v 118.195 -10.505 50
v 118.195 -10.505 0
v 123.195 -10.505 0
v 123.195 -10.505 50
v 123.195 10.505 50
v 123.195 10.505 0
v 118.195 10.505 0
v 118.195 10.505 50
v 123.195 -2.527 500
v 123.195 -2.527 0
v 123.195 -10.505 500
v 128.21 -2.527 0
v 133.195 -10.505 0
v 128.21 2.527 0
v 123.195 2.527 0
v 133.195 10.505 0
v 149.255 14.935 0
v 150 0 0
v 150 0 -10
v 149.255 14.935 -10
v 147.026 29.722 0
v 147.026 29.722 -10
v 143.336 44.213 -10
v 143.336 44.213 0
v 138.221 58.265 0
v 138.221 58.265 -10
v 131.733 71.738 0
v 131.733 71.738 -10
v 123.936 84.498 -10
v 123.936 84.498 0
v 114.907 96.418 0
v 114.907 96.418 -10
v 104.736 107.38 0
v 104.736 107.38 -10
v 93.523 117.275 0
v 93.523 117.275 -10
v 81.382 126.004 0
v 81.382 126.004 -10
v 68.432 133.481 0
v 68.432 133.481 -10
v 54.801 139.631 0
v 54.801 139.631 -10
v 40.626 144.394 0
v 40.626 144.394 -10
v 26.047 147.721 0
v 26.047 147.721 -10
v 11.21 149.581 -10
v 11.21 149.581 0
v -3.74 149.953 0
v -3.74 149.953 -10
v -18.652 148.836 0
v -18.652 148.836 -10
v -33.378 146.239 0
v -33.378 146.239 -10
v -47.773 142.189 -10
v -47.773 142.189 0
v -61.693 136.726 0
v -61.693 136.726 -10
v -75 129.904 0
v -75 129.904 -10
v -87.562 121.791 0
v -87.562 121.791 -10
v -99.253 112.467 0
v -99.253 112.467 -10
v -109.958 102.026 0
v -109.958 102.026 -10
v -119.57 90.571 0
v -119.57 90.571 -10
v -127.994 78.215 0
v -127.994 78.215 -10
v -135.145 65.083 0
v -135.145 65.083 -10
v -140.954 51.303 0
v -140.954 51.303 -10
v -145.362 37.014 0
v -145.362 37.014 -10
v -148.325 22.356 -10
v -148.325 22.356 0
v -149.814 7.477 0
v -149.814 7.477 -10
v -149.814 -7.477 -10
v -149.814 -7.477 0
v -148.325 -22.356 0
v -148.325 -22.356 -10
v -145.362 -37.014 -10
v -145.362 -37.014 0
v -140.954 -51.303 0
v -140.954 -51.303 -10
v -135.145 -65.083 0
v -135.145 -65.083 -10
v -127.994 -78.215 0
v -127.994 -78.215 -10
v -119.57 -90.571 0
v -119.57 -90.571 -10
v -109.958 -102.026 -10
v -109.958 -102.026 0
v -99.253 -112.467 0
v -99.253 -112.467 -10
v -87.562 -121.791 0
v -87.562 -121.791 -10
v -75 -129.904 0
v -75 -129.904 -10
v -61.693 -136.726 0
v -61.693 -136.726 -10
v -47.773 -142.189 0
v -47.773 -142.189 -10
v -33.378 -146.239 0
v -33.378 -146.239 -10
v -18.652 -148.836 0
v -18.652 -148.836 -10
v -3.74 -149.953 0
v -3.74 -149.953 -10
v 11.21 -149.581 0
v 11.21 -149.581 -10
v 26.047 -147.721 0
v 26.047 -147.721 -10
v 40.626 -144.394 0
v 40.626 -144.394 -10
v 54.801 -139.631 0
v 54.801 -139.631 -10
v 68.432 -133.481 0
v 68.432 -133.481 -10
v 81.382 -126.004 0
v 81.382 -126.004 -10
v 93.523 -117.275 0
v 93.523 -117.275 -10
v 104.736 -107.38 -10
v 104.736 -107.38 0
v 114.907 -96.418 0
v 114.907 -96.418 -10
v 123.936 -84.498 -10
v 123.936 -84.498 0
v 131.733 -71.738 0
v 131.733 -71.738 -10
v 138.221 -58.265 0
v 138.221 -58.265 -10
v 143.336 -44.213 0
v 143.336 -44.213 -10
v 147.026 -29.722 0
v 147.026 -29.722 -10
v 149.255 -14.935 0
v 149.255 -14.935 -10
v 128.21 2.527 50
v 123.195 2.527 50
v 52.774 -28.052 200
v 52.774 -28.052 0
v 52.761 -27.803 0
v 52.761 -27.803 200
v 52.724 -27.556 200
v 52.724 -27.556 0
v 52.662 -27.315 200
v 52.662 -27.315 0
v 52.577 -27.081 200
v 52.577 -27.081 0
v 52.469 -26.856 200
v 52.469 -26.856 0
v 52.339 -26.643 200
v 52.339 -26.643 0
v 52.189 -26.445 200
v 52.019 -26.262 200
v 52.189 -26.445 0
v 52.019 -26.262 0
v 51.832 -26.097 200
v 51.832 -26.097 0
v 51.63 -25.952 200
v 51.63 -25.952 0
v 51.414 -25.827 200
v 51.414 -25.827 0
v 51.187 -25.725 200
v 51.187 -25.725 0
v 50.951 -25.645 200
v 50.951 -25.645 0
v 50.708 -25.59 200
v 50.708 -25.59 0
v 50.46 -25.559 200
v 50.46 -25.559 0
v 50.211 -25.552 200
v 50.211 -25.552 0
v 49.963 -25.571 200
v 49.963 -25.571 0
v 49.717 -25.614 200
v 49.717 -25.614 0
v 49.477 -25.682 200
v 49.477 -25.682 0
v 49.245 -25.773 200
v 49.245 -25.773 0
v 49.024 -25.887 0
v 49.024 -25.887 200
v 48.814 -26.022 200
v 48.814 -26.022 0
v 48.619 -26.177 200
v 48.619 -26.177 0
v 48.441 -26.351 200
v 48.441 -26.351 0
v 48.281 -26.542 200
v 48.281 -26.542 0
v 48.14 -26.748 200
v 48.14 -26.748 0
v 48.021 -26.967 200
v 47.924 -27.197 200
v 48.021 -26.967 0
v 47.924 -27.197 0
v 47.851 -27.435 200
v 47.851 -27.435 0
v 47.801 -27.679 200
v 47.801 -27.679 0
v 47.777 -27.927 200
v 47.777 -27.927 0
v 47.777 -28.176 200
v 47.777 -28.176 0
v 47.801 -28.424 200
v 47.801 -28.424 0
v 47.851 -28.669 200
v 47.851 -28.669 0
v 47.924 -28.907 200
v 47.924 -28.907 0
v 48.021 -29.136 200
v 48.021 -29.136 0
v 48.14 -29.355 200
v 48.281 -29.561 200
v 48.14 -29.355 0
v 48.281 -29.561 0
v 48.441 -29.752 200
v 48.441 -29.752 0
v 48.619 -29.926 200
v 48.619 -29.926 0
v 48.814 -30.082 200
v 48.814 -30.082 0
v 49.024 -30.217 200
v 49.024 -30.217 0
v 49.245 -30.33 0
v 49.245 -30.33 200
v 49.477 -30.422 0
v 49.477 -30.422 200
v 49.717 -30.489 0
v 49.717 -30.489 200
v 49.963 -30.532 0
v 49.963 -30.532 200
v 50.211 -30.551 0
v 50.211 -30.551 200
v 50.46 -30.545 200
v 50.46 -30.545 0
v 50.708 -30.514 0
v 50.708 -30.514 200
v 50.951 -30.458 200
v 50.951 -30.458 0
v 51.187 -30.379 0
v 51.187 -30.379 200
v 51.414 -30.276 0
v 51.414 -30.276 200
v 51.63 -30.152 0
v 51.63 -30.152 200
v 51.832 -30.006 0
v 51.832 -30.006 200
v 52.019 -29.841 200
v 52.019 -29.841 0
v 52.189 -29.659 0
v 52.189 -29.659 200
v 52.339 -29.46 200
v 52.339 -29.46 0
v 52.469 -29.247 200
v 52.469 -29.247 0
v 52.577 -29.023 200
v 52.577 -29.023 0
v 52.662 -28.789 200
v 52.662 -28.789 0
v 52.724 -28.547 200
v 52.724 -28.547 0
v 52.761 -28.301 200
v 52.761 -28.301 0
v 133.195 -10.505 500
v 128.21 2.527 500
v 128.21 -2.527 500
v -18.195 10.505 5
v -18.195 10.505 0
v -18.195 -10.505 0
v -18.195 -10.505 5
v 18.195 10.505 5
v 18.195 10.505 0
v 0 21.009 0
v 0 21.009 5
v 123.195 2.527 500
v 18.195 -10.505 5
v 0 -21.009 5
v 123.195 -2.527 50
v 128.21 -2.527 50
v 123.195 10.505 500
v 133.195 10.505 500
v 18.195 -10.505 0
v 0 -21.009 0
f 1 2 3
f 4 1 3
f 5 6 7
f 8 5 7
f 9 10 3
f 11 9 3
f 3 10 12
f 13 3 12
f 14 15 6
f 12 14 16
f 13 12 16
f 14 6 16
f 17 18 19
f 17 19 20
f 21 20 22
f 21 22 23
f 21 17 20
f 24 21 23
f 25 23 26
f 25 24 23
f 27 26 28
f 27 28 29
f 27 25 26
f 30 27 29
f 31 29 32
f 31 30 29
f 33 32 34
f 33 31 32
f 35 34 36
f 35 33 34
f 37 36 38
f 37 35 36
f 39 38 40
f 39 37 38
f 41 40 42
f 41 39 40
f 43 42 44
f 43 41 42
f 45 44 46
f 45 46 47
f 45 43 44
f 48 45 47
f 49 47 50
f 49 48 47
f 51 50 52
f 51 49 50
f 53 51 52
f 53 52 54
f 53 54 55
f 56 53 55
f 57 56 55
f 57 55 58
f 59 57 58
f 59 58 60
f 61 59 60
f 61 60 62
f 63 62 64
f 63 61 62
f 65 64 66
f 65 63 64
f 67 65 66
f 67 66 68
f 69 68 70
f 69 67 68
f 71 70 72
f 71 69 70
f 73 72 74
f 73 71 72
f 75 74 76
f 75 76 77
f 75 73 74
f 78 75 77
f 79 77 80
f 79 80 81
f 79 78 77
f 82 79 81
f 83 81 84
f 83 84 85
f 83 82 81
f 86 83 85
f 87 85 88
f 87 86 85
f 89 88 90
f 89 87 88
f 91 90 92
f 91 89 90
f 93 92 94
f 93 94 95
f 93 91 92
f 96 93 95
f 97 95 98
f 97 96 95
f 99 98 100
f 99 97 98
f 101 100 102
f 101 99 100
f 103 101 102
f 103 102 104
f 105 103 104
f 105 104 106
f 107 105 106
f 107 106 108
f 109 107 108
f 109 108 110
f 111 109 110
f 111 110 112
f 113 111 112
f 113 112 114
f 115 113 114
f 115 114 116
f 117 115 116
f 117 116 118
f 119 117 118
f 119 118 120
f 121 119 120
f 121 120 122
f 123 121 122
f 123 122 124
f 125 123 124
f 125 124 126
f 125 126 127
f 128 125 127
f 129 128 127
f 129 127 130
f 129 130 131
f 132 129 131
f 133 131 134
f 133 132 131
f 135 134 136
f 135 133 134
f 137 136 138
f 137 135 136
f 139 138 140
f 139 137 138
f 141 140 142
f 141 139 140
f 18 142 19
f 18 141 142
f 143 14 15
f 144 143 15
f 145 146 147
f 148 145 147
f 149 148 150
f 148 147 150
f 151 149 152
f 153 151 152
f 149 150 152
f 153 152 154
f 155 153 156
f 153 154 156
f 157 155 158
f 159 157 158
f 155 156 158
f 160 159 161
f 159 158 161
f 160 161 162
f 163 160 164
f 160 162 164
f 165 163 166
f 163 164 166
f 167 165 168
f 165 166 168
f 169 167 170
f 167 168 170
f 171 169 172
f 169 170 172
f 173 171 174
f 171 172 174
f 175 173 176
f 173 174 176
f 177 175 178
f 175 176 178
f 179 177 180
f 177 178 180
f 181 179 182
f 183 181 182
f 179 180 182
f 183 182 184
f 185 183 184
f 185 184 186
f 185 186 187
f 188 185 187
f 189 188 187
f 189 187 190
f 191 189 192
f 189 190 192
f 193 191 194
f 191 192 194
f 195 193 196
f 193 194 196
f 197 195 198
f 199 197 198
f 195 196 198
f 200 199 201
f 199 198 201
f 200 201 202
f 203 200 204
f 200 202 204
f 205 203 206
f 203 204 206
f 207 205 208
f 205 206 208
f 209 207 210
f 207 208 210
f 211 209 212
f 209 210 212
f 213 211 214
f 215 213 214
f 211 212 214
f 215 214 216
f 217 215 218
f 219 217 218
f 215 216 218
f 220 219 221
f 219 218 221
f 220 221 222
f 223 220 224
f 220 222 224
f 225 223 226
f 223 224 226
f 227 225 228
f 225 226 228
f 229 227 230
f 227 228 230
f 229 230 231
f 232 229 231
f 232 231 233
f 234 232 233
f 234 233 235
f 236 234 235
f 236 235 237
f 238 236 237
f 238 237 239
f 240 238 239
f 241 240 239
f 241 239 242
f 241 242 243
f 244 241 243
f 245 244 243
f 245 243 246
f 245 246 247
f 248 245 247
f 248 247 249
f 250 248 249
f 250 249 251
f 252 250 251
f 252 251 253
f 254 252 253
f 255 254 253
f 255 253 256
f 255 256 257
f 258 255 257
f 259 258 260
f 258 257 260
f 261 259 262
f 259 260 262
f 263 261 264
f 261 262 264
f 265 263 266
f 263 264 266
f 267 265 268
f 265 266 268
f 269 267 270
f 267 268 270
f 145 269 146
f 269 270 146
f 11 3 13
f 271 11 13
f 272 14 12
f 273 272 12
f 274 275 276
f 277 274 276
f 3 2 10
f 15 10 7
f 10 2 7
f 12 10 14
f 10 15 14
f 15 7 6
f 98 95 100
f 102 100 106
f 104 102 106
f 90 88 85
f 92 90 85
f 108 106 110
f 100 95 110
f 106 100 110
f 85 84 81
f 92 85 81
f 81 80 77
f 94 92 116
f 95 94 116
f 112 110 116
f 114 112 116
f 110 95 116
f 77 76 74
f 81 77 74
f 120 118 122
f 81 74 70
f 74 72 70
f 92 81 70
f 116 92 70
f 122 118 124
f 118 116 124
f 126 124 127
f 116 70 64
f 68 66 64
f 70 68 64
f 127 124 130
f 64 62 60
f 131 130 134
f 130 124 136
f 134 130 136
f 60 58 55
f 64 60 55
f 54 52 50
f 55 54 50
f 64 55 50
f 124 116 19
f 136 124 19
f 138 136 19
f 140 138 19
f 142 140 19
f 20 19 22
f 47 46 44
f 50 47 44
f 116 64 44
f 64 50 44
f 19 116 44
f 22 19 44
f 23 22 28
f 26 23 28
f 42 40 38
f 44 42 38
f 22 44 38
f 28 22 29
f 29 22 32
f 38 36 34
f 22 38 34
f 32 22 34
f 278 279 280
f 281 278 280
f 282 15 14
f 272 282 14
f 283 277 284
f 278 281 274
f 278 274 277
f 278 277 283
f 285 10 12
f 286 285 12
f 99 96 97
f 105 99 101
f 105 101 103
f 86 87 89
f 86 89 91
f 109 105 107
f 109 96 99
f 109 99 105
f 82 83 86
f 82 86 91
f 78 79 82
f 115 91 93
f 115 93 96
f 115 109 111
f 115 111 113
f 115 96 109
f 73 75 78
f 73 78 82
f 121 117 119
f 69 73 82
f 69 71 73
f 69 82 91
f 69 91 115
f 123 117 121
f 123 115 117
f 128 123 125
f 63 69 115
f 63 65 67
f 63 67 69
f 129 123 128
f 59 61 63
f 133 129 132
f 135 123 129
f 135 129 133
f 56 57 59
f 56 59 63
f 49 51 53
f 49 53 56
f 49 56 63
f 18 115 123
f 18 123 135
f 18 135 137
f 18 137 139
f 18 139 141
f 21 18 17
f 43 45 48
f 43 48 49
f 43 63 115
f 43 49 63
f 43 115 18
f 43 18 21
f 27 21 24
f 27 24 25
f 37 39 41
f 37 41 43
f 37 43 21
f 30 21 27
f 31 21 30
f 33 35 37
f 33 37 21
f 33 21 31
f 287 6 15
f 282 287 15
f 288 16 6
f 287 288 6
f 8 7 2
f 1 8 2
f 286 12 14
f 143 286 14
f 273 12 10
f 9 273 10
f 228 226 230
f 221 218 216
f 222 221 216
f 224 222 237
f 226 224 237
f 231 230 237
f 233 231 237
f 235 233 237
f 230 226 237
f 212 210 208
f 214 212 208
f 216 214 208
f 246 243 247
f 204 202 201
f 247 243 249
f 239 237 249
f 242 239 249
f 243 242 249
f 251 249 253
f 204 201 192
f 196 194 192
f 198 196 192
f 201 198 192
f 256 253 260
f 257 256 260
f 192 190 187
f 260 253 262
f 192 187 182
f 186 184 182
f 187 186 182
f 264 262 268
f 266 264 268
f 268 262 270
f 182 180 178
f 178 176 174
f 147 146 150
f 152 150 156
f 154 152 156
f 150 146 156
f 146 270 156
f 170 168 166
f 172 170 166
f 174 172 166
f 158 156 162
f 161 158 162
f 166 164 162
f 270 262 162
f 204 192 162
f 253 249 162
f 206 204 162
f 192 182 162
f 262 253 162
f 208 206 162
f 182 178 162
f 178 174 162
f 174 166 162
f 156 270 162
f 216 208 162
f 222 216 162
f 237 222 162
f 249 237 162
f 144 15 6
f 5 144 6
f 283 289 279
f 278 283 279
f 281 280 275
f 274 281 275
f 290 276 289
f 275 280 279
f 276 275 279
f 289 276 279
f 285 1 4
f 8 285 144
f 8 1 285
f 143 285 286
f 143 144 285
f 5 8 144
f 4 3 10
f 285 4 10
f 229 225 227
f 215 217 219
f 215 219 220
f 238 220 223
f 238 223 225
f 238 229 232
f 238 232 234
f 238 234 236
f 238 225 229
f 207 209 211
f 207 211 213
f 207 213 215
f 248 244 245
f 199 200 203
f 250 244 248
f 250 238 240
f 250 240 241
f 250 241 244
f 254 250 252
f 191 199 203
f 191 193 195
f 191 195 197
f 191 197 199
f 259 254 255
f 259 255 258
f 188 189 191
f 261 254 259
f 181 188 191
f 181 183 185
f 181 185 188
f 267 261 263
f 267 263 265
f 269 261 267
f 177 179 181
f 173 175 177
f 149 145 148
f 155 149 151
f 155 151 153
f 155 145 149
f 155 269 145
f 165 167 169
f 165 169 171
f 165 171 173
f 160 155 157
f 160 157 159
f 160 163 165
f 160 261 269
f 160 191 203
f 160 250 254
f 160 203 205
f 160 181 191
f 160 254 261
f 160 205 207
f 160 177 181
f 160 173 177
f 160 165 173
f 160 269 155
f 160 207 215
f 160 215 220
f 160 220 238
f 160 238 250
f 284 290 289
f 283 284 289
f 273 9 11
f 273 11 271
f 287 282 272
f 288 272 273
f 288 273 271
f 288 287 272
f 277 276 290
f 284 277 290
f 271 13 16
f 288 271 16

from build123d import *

# Parameters (mm, degrees)
F1_DEPTH = 500
F2_DEPTH = 5
F3_DEPTH = 50
F0_R     = 2.5
F4_DEPTH = 200
F0_R_2   = 150
F5_DEPTH = 10


with BuildPart() as f1:
    # F0 (on Top) → F1 (new body)
    with BuildSketch(Plane.XY):
        Polygon((133.19461, 10.504663), (123.19461, 10.504663), (123.19461, 2.526928), (128.209675, 2.526928), (128.209675, -2.526928), (123.19461, -2.526928), (123.19461, -10.504663), (133.19461, -10.504663), align=None)
    extrude(amount=F1_DEPTH)


with BuildPart() as f2:
    # F0 (on Top) → F2 (new body)
    with BuildSketch(Plane.XY):
        Polygon((18.19461, -10.504663), (18.19461, 10.504663), (0, 21.009326), (-18.19461, 10.504663), (-18.19461, -10.504663), (0, -21.009326), align=None)
    extrude(amount=F2_DEPTH)


with BuildPart() as f3:
    # F0 (on Top) → F3 (new body)
    with BuildSketch(Plane.XY):
        Polygon((123.19461, 10.504663), (118.19461, 10.504663), (118.19461, -10.504663), (123.19461, -10.504663), (123.19461, -2.526928), (128.209675, -2.526928), (128.209675, 2.526928), (123.19461, 2.526928), align=None)
    extrude(amount=F3_DEPTH)


with BuildPart() as f4:
    # F0 (on Top) → F4 (new body)
    with BuildSketch(Plane.XY):
        with Locations((50.273504, -28.051721)):
            Circle(F0_R)
    extrude(amount=F4_DEPTH)


with BuildPart() as f5:
    # F0 (on Top) → F5 (new body)
    with BuildSketch(Plane.XY):
        Circle(F0_R_2)
        with Locations((50.273504, -28.051721)):
            Circle(F0_R, mode=Mode.SUBTRACT)
        Polygon((0, 21.009326), (18.19461, 10.504663), (18.19461, -10.504663), (0, -21.009326), (-18.19461, -10.504663), (-18.19461, 10.504663), align=None, mode=Mode.SUBTRACT)
        Polygon((118.19461, -10.504663), (118.19461, 10.504663), (123.19461, 10.504663), (133.19461, 10.504663), (133.19461, -10.504663), (123.19461, -10.504663), align=None, mode=Mode.SUBTRACT)
        Polygon((133.19461, 10.504663), (123.19461, 10.504663), (123.19461, 2.526928), (128.209675, 2.526928), (128.209675, -2.526928), (123.19461, -2.526928), (123.19461, -10.504663), (133.19461, -10.504663), align=None)
        Polygon((123.19461, 10.504663), (118.19461, 10.504663), (118.19461, -10.504663), (123.19461, -10.504663), (123.19461, -2.526928), (128.209675, -2.526928), (128.209675, 2.526928), (123.19461, 2.526928), align=None)
        Polygon((18.19461, -10.504663), (18.19461, 10.504663), (0, 21.009326), (-18.19461, 10.504663), (-18.19461, -10.504663), (0, -21.009326), align=None)
        with Locations((50.273504, -28.051721)):
            Circle(F0_R)
    extrude(amount=-F5_DEPTH)


solid = Compound([f1.part, f2.part, f3.part, f4.part, f5.part])
